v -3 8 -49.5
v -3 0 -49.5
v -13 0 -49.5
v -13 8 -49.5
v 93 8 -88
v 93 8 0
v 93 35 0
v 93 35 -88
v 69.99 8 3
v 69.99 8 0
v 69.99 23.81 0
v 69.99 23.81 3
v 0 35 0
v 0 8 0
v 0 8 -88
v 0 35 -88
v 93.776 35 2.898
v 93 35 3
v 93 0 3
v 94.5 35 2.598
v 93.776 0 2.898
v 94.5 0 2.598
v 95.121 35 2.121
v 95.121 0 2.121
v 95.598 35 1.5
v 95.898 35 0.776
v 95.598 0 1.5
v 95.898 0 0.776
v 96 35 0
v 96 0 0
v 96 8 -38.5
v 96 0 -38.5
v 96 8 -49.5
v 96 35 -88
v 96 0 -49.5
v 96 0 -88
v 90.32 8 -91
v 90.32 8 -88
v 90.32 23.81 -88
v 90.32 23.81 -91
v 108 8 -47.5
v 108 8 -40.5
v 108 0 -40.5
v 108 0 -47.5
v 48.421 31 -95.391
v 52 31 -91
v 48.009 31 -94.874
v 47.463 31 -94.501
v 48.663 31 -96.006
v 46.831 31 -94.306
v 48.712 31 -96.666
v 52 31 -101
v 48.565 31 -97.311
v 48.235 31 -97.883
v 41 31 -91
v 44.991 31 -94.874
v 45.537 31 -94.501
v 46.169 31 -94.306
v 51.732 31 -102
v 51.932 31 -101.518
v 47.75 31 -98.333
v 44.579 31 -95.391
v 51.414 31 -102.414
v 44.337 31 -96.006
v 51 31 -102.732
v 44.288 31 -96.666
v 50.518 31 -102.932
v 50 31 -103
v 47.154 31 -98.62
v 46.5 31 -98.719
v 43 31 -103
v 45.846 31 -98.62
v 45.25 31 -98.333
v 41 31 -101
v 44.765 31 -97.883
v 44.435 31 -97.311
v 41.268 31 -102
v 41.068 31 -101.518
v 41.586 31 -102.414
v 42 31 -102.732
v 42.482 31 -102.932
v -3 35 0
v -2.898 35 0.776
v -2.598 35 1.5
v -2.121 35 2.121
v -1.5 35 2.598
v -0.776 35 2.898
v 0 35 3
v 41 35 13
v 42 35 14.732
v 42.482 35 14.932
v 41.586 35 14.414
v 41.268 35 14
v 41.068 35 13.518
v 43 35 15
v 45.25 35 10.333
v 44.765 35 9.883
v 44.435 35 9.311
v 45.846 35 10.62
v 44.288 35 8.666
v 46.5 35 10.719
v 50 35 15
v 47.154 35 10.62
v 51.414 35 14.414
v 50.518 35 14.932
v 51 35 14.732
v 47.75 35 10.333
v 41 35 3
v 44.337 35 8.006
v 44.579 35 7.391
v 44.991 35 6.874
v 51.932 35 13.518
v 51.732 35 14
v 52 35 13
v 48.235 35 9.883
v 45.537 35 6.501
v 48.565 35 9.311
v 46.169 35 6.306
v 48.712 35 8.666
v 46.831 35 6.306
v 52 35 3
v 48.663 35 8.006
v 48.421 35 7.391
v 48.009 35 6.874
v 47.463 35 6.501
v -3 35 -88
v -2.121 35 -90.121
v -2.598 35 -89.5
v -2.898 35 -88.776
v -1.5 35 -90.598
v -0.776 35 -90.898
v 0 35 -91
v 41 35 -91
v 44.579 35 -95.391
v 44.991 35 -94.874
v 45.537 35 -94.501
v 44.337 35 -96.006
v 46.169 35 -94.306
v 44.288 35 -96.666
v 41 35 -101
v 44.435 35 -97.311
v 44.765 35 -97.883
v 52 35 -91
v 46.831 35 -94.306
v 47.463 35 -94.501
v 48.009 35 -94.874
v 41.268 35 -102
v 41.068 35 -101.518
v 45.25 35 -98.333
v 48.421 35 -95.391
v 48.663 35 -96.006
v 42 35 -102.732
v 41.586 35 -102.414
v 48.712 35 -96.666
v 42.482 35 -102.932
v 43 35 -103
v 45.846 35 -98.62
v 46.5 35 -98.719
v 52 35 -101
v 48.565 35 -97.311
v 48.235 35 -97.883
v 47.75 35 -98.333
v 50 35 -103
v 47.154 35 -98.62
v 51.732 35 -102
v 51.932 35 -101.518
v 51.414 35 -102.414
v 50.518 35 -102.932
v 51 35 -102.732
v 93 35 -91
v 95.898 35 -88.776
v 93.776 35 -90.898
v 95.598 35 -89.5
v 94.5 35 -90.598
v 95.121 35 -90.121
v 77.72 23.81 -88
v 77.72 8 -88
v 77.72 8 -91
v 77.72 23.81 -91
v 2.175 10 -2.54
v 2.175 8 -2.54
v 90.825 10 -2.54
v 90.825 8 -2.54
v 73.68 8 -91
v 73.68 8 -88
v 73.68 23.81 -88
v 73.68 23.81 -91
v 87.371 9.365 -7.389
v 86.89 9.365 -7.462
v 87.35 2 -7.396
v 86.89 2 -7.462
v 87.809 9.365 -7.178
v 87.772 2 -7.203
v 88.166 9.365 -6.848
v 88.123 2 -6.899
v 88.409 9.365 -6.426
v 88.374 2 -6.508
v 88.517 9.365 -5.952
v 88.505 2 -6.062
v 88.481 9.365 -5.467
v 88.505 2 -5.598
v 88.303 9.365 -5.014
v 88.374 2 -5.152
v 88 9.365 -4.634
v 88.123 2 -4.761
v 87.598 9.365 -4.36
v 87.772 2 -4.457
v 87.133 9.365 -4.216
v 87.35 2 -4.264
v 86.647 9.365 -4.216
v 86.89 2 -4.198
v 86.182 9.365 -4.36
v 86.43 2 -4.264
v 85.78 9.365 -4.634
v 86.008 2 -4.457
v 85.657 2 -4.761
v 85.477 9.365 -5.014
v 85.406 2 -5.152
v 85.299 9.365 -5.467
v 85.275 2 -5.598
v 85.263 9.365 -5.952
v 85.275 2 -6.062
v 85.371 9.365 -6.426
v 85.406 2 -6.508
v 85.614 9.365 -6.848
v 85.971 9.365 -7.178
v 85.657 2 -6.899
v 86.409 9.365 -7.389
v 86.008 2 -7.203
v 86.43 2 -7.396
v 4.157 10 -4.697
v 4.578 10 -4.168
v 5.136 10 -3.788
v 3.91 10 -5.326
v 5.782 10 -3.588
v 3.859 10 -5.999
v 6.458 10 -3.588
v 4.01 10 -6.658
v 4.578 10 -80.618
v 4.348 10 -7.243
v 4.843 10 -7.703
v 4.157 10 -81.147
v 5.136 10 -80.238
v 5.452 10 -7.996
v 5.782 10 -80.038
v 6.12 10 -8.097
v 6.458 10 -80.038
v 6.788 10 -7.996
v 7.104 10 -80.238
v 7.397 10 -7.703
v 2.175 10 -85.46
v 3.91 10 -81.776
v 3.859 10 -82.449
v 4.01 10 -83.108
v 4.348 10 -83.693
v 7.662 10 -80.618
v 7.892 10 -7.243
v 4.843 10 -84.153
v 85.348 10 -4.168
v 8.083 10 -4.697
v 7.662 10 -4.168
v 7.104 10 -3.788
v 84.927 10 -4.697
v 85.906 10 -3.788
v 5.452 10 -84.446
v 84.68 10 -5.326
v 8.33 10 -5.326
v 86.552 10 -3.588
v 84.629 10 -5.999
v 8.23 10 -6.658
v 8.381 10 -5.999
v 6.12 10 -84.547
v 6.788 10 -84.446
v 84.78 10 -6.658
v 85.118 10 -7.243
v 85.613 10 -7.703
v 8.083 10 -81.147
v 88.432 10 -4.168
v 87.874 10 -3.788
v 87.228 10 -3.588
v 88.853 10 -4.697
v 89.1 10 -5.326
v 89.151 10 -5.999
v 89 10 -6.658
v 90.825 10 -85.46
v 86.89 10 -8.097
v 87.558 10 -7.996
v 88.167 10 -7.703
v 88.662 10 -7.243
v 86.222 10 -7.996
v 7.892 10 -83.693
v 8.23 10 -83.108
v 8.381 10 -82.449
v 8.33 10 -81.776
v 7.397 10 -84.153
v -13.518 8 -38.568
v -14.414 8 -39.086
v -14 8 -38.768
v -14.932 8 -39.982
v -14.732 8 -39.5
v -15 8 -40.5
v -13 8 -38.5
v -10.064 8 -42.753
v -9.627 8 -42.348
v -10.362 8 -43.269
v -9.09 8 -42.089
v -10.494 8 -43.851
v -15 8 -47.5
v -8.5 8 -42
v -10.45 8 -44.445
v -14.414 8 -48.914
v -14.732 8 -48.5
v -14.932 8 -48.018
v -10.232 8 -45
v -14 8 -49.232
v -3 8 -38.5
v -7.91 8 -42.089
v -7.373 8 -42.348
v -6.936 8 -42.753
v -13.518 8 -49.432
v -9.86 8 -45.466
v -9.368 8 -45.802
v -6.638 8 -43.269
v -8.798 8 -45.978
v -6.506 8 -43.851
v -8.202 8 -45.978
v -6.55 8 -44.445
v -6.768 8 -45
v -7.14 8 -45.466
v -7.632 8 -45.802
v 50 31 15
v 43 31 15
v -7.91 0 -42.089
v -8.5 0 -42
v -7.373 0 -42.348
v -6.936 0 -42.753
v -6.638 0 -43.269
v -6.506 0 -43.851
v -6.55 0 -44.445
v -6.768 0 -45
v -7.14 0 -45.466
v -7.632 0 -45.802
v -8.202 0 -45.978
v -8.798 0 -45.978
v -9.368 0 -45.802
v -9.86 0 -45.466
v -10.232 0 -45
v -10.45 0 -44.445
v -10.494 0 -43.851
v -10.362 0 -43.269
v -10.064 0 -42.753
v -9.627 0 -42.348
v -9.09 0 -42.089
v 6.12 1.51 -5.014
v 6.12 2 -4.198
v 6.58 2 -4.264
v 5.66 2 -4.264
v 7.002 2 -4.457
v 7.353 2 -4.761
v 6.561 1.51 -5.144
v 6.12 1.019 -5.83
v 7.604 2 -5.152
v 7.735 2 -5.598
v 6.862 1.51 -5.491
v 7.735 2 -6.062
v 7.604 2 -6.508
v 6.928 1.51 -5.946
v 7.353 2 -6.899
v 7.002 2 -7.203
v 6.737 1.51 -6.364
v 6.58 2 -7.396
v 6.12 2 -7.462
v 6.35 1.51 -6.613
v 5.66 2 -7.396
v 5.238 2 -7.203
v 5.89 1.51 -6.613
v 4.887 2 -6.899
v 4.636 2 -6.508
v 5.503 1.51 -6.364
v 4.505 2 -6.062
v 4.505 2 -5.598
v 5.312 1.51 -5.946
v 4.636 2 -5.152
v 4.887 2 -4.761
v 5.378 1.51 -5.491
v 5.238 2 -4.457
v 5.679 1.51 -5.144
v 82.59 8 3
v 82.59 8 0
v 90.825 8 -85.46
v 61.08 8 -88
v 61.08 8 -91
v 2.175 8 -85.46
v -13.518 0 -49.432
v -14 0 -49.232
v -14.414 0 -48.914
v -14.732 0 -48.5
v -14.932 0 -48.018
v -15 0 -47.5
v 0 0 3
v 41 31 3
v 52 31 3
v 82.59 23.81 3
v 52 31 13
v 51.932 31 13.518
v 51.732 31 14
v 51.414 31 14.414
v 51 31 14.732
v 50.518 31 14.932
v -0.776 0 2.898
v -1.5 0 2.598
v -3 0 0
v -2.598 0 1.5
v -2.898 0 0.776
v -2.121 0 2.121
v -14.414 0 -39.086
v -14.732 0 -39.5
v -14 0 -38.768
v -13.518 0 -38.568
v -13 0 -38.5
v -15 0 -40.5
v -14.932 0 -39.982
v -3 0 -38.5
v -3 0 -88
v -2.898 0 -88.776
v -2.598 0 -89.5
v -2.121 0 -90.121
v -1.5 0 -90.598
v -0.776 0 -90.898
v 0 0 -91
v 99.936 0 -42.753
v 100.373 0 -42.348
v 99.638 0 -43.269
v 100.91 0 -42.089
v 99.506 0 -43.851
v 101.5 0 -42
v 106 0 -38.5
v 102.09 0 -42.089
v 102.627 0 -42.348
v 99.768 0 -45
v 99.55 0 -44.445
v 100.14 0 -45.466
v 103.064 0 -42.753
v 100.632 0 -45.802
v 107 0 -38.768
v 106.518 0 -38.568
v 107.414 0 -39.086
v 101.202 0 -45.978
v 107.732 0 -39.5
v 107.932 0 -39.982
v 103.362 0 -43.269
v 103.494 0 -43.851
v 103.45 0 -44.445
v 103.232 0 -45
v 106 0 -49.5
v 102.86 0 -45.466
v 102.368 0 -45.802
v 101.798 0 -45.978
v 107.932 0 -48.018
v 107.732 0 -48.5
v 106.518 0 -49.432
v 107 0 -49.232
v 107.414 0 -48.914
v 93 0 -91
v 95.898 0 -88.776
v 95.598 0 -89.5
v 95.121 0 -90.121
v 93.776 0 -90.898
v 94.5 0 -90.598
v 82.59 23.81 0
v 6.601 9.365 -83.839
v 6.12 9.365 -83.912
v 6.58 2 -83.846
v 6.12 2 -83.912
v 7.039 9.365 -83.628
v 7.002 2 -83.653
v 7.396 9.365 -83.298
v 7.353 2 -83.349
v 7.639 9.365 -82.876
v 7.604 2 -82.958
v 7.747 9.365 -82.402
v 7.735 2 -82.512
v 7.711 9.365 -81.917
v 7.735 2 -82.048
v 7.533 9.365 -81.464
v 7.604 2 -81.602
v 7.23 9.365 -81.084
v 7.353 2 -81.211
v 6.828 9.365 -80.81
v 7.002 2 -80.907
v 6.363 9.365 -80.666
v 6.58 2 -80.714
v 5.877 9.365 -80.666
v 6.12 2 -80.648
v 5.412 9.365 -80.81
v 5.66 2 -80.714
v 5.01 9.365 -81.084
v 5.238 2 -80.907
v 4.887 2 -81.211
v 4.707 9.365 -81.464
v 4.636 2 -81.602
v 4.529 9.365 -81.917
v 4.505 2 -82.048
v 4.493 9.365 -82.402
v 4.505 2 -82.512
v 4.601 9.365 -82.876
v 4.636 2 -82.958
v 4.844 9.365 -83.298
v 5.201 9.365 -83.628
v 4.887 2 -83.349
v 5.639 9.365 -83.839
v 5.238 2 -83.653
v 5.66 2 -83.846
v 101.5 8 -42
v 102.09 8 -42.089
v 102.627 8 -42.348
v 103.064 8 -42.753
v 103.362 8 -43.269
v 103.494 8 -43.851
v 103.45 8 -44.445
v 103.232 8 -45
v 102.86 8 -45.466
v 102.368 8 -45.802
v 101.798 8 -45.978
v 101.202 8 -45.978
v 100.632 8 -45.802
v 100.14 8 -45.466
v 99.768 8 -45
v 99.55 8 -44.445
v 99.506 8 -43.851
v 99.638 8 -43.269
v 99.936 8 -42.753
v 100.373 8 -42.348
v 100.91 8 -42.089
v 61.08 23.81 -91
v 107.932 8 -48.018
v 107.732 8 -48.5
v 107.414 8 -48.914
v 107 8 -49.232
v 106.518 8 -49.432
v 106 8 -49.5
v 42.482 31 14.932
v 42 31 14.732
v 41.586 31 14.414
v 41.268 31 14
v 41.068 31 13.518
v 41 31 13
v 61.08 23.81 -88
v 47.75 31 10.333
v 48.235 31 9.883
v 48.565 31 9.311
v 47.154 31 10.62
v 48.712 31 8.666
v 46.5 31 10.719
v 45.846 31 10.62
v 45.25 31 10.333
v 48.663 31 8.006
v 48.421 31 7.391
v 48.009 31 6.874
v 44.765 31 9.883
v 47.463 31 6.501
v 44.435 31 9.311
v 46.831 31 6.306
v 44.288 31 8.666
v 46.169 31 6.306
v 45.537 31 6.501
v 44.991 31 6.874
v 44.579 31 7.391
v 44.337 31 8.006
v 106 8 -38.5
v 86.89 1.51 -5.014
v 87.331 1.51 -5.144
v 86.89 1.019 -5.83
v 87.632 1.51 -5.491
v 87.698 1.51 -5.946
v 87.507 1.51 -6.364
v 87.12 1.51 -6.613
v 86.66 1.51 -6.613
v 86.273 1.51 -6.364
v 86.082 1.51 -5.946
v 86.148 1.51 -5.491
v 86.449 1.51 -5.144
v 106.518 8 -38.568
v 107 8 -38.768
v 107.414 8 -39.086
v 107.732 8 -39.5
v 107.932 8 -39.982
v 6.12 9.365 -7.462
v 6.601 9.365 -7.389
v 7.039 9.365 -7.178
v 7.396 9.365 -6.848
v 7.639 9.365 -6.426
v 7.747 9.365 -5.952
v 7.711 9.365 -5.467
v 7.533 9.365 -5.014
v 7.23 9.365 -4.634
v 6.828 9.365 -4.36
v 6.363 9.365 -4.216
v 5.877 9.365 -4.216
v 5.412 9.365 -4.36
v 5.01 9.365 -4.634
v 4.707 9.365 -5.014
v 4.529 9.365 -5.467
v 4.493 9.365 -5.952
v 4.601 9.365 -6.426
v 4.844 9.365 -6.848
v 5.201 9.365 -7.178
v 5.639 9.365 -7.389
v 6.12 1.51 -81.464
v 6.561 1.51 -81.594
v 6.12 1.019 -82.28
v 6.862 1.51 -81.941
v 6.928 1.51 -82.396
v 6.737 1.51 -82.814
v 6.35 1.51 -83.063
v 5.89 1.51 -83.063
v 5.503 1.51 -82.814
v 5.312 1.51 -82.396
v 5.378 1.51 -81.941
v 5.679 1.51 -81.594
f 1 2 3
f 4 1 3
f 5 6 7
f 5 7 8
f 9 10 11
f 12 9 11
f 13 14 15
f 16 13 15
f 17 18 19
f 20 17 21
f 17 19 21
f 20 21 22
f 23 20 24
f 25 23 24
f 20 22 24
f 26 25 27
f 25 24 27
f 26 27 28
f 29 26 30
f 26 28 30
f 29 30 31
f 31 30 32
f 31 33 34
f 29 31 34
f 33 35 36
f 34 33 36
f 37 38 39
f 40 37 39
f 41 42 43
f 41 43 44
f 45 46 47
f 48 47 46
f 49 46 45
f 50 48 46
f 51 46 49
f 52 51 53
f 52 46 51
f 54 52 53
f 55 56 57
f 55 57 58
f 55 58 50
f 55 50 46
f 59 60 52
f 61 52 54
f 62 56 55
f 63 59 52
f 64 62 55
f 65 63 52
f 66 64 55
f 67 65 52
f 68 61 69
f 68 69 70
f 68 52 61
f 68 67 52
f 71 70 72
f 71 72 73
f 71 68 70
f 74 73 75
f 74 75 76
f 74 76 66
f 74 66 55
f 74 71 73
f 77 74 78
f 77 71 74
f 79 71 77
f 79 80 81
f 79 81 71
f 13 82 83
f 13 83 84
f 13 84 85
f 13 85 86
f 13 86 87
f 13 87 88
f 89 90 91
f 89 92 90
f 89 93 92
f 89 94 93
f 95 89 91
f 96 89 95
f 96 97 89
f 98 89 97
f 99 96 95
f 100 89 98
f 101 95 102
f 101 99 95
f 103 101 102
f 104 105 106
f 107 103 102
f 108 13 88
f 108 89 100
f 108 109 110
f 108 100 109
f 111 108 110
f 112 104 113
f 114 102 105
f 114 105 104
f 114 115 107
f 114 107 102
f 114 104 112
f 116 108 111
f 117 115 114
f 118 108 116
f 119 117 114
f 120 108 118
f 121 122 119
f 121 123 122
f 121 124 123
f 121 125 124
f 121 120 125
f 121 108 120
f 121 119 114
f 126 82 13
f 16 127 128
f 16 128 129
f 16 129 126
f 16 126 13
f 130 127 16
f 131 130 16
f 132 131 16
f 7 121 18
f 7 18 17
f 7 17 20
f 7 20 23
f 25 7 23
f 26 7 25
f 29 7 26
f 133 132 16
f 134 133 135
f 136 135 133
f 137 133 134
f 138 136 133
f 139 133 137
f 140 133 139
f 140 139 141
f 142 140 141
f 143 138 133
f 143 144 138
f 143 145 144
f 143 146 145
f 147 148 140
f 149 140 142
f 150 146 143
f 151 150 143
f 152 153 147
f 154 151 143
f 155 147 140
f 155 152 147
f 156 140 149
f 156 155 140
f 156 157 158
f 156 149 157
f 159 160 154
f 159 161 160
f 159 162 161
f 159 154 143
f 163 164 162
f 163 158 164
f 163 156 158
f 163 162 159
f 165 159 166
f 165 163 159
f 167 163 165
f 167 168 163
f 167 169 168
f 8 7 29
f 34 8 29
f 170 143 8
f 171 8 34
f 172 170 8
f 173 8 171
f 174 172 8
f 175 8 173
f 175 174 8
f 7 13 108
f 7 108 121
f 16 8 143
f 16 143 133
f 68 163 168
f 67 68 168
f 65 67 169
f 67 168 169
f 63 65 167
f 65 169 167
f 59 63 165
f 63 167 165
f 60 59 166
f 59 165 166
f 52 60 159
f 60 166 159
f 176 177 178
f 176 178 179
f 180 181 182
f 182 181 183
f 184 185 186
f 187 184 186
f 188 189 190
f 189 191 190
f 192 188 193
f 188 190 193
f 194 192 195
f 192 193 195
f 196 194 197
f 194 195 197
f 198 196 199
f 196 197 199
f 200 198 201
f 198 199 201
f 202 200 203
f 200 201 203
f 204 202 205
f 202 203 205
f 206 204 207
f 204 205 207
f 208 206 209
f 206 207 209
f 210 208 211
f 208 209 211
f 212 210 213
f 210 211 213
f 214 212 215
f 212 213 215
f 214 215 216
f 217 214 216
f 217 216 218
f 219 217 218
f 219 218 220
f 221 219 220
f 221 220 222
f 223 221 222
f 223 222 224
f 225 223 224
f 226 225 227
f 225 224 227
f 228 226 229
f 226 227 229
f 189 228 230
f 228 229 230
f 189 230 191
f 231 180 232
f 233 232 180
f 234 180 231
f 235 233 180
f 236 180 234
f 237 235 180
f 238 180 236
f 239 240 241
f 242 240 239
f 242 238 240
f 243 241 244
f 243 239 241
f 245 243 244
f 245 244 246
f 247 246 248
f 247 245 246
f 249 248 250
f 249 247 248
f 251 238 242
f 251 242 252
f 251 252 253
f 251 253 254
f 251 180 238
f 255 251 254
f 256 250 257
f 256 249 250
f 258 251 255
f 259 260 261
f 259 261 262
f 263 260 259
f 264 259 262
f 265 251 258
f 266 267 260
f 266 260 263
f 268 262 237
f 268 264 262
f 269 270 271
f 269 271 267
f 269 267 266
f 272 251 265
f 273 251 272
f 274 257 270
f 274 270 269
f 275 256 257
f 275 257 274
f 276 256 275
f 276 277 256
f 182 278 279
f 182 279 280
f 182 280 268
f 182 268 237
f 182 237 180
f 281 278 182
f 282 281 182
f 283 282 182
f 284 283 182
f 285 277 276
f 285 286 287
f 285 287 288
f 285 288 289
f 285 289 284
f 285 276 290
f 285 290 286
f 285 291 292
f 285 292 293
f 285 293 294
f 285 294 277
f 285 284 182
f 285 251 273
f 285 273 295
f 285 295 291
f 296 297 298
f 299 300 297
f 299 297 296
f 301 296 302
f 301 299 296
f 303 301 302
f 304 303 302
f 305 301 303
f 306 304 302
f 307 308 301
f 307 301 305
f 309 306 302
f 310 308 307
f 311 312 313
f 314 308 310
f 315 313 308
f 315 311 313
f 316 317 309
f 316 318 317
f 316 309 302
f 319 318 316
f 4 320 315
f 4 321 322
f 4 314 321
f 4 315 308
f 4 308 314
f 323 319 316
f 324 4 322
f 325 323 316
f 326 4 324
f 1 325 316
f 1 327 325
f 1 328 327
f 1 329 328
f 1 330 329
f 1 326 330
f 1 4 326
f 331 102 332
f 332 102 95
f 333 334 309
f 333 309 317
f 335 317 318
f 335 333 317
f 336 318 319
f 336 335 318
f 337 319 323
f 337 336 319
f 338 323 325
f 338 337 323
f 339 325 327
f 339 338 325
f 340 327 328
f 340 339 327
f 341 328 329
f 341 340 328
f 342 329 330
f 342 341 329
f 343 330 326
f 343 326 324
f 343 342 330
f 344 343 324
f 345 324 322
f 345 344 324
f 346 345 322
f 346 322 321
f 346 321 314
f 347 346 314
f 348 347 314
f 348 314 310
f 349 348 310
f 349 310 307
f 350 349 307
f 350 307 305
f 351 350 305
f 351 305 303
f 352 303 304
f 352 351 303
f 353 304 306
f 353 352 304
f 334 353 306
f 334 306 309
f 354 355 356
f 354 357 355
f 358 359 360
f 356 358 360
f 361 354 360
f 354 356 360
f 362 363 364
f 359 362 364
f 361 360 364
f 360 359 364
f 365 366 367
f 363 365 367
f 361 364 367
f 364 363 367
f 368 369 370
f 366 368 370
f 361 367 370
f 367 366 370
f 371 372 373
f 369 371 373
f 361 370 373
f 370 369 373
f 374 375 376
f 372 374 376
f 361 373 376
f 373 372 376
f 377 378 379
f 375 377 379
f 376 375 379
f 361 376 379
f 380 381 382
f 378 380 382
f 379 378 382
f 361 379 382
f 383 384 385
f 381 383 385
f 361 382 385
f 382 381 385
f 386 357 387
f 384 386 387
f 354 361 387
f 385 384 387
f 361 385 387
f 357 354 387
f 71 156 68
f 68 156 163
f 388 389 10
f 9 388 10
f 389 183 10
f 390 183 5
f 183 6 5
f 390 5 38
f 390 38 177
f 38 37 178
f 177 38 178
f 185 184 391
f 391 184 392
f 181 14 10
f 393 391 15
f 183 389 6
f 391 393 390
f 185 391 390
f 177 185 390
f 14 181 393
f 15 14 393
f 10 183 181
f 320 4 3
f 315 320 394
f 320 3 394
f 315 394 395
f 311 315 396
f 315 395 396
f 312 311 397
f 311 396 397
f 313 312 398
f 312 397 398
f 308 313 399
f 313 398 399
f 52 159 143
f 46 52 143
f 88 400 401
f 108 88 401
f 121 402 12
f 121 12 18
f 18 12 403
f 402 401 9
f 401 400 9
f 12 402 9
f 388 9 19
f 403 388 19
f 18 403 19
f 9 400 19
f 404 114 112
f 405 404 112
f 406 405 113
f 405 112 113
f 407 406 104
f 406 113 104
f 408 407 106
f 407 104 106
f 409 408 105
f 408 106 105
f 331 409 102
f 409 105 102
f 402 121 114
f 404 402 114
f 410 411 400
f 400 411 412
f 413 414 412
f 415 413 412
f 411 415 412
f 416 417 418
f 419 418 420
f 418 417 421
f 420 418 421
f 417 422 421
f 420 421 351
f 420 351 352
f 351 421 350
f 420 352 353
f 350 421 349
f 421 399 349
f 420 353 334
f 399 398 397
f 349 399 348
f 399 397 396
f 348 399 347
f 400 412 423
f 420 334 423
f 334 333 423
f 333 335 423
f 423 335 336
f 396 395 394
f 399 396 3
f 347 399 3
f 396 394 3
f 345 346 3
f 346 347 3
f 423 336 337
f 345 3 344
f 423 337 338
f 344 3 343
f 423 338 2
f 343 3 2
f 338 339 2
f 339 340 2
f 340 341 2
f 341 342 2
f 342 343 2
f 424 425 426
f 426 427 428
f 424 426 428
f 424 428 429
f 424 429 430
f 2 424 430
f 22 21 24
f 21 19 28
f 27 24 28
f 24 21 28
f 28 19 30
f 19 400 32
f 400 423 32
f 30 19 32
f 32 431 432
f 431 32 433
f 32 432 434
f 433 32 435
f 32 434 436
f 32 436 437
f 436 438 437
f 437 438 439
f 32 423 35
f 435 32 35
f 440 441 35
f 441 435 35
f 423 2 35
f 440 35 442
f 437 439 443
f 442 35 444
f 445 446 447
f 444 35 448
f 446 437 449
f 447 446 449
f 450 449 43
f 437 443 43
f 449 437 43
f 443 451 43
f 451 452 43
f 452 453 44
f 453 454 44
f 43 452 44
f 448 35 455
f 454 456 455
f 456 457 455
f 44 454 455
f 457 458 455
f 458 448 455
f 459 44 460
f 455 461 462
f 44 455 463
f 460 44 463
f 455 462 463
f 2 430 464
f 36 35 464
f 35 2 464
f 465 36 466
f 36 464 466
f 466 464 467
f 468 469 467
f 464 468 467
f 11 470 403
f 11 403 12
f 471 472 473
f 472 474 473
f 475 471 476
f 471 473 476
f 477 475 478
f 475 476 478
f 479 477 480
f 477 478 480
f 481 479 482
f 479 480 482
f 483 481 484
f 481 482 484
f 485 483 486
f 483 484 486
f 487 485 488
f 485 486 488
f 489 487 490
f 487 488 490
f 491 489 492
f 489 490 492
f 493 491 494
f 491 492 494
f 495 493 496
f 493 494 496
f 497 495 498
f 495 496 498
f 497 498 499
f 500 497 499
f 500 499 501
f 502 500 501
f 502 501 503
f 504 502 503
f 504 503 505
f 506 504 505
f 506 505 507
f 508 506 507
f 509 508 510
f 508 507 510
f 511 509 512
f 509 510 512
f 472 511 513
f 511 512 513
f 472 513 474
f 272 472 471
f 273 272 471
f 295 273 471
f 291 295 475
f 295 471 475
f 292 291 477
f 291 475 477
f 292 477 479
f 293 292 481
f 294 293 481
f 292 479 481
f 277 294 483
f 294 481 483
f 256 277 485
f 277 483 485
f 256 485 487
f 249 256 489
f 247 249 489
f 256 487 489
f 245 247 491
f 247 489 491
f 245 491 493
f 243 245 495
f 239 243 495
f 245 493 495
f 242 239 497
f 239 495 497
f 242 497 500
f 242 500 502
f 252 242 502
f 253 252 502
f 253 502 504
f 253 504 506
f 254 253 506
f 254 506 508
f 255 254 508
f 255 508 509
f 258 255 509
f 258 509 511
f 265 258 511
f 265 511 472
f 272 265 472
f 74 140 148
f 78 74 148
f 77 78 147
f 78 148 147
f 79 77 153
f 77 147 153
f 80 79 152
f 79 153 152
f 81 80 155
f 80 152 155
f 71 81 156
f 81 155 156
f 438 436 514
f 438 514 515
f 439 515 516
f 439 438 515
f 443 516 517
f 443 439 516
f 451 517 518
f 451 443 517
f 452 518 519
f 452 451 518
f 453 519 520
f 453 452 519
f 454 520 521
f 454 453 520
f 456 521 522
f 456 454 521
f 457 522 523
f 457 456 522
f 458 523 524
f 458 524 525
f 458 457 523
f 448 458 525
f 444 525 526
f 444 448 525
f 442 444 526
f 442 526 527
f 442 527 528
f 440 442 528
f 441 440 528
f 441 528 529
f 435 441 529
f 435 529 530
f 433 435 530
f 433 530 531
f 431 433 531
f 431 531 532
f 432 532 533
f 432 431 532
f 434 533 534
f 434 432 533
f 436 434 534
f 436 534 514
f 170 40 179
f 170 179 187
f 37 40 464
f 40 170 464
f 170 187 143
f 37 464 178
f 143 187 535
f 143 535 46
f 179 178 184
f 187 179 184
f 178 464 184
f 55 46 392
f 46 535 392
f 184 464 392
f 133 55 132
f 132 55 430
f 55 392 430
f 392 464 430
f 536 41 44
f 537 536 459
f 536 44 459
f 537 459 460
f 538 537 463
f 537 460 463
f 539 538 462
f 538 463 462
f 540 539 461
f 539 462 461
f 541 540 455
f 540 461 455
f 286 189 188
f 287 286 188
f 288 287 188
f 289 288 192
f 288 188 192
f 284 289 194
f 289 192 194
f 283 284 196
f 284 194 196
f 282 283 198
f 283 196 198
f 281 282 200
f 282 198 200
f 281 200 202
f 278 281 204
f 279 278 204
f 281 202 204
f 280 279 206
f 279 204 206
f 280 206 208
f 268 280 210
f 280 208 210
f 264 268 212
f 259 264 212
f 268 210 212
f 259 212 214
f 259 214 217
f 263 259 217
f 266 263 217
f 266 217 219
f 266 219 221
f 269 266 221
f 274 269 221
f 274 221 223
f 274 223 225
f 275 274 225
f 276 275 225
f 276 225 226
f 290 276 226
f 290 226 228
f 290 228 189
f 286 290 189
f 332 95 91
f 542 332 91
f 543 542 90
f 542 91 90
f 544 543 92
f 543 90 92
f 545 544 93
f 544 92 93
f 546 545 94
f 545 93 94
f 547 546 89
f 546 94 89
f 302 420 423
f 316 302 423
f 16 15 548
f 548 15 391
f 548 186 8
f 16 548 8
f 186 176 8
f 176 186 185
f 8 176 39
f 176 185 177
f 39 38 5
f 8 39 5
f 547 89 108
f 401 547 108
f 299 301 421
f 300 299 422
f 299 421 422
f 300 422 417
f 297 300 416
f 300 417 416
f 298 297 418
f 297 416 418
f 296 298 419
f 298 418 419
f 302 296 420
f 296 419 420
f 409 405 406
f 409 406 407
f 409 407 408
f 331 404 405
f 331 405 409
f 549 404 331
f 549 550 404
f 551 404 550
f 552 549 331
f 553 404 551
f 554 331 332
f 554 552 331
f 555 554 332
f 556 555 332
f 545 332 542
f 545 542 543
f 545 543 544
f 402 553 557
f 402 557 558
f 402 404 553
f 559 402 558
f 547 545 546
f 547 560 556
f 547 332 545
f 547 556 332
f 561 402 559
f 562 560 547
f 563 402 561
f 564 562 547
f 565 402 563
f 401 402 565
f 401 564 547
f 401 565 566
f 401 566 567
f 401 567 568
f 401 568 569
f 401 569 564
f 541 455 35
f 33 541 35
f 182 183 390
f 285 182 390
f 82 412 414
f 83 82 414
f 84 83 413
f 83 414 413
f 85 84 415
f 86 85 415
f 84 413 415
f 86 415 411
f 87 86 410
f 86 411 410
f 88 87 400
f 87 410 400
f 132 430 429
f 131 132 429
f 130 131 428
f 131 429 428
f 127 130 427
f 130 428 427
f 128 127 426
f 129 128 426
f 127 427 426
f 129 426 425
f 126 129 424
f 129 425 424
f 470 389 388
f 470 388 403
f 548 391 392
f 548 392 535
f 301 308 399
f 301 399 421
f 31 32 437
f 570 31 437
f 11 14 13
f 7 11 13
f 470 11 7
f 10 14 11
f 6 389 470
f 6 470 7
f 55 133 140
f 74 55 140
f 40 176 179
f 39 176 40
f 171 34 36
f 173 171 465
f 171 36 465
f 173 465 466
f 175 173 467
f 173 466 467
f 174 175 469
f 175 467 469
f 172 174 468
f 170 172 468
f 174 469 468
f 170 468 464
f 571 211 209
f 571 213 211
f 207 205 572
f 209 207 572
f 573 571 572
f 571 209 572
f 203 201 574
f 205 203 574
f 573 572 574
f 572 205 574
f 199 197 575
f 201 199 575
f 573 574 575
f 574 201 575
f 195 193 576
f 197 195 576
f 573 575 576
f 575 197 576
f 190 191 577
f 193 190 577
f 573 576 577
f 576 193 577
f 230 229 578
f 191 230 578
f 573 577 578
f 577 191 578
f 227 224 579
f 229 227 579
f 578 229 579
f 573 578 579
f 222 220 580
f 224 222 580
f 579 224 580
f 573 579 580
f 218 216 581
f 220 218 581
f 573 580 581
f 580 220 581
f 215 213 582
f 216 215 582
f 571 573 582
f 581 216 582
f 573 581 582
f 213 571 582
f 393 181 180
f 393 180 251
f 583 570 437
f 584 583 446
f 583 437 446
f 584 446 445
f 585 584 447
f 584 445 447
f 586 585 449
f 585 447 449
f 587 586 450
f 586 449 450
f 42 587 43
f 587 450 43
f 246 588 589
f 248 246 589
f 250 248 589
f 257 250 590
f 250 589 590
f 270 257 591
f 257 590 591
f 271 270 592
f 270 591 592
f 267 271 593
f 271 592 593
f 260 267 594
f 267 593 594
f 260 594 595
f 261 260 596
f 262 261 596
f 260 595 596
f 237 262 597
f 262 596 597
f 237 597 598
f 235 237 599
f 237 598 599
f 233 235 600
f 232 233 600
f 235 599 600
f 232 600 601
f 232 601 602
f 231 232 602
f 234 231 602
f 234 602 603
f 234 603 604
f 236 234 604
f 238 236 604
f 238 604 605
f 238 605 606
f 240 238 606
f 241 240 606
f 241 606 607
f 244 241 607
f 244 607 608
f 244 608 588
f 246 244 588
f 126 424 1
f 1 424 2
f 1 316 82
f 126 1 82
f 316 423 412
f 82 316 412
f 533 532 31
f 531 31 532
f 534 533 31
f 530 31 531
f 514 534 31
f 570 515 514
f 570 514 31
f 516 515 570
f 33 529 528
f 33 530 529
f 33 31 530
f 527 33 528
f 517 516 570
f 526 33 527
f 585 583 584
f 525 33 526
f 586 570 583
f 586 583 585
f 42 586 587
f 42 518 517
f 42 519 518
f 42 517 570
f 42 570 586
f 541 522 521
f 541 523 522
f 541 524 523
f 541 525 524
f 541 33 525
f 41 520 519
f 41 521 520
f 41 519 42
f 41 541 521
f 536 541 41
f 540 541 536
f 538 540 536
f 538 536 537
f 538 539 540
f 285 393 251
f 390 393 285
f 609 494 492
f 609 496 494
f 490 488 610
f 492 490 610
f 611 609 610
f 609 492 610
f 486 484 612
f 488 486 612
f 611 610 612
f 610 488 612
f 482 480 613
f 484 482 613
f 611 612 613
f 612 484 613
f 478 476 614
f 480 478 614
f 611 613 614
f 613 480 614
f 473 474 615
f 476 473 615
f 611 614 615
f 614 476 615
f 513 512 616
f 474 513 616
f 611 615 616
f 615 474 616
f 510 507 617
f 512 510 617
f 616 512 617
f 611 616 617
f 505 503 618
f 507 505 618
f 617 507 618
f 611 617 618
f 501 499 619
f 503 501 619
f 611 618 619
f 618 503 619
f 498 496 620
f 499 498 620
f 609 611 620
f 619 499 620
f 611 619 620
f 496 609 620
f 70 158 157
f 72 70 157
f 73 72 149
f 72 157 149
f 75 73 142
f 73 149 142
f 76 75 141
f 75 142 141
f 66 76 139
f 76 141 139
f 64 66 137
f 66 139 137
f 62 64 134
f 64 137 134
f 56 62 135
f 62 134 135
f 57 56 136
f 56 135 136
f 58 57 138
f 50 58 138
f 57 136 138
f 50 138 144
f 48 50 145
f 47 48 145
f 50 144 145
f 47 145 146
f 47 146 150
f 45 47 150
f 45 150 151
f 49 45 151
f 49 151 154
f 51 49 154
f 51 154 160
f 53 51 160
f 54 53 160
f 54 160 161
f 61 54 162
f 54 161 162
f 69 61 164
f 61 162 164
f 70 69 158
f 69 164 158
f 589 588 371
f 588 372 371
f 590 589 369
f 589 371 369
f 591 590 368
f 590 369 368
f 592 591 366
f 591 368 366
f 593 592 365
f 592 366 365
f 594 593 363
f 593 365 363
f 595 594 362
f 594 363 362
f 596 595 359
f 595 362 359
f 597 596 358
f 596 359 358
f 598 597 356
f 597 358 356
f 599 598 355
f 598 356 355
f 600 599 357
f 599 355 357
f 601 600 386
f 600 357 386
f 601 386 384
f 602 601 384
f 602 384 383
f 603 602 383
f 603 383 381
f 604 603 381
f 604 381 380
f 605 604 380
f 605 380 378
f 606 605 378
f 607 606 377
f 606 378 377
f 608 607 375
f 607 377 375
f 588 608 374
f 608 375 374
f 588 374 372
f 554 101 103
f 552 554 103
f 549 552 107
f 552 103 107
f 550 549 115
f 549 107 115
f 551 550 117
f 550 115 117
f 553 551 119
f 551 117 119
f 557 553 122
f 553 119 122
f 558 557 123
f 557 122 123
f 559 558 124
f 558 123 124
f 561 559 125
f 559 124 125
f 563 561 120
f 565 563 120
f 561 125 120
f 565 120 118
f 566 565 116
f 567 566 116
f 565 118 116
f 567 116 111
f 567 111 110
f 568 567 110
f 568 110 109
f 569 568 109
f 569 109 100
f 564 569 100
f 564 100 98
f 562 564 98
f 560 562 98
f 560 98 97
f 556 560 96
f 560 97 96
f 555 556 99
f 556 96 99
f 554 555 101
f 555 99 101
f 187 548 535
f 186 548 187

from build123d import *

# Parameters (mm, degrees)
ESBO_O1_W                        = 93
ESBO_O1_H                        = 88
RESSALTO_EXTRUS_O2_DEPTH         = 35
ESBO_O1_5_W                      = 93
ESBO_O1_5_H                      = 88
RESSALTO_EXTRUS_O3_DEPTH         = 8
ESBO_O1_7_R                      = 2
RESSALTO_EXTRUS_O6_DEPTH         = 8
ESBO_O4_R                        = 2.218632056
RESSALTO_EXTRUS_O7_DEPTH         = 4
ESBO_O5_W                        = 88.65
ESBO_O5_H                        = 82.92
RESSALTO_EXTRUS_O8_DEPTH         = 2
ESBO_O7_W                        = 12.6
ESBO_O7_H                        = 15.81
CORTE_EXTRUS_O1_DEPTH            = 154.290573748
ESBO_O8_W                        = 12.6
ESBO_O8_H                        = 15.81
CORTE_EXTRUS_O2_DEPTH            = 154.290573748
FURO_COM_FOLGA_DE_41_D           = 3.2639
FURO_COM_FOLGA_DE_41_DEPTH       = 8
FURO_COM_FOLGA_DE_41_CSINK_D     = 4.5339
FURO_COM_FOLGA_DE_41_CSINK_ANGLE = 90
FURO_COM_FOLGA_DE_41_TIP         = 0.980574487


with BuildPart() as part:
    # Esboço1 → Ressalto-extrusão2 (new body)
    with BuildSketch(Plane(origin=(0, 0, 0), x_dir=(1, 0, 0), z_dir=(0, 1, 0))):
        with BuildLine():
            ThreePointArc((-3, 0), (-2.121320344, -2.121320344), (0, -3))
            Line((0, -3), (93, -3))
            ThreePointArc((93, -3), (95.121320344, -2.121320344), (96, 0))
            Line((96, 0), (96, 38.5))
            Line((96, 38.5), (96, 49.5))
            Line((96, 49.5), (96, 88))
            ThreePointArc((96, 88), (95.121320344, 90.121320344), (93, 91))
            Line((93, 91), (0, 91))
            ThreePointArc((0, 91), (-2.121320344, 90.121320344), (-3, 88))
            Line((-3, 88), (-3, 49.5))
            Line((-3, 49.5), (-3, 38.5))
            Line((-3, 38.5), (-3, 0))
        make_face()
        with Locations((46.5, 44)):
            Rectangle(ESBO_O1_W, ESBO_O1_H, mode=Mode.SUBTRACT)
    extrude(amount=RESSALTO_EXTRUS_O2_DEPTH)

    # Esboço1<5> → Ressalto-extrusão3 (add)
    with BuildSketch(Plane(origin=(0, 0, 0), x_dir=(1, 0, 0), z_dir=(0, 1, 0))):
        with Locations((46.5, 44)):
            Rectangle(ESBO_O1_5_W, ESBO_O1_5_H)
    extrude(amount=RESSALTO_EXTRUS_O3_DEPTH)

    # Esboço1<7> → Ressalto-extrusão6 (add)
    # profile 1 of 2: a face of its own
    with BuildSketch(Plane(origin=(0, 0, 0), x_dir=(1, 0, 0), z_dir=(0, 1, 0))):
        with BuildLine():
            Line((-13, 38.5), (-3, 38.5))
            Line((-3, 38.5), (-3, 49.5))
            Line((-3, 49.5), (-13, 49.5))
            ThreePointArc((-13, 49.5), (-14.414213562, 48.914213562), (-15, 47.5))
            Line((-15, 47.5), (-15, 40.5))
            ThreePointArc((-15, 40.5), (-14.414213562, 39.085786438), (-13, 38.5))
        make_face()
        with Locations((-8.5, 44)):
            Circle(ESBO_O1_7_R, mode=Mode.SUBTRACT)
    # profile 2 of 2: a face of its own
    with BuildSketch(Plane(origin=(0, 0, 0), x_dir=(1, 0, 0), z_dir=(0, 1, 0))):
        with BuildLine():
            Line((96, 49.5), (96, 38.5))
            Line((96, 38.5), (106, 38.5))
            ThreePointArc((106, 38.5), (107.414213562, 39.085786438), (108, 40.5))
            Line((108, 40.5), (108, 47.5))
            ThreePointArc((108, 47.5), (107.414213562, 48.914213562), (106, 49.5))
            Line((106, 49.5), (96, 49.5))
        make_face()
        with Locations((101.5, 44)):
            Circle(ESBO_O1_7_R, mode=Mode.SUBTRACT)
    extrude(amount=RESSALTO_EXTRUS_O6_DEPTH)

    # Esboço4 → Ressalto-extrusão7 (add)
    # profile 1 of 2: a face of its own
    with BuildSketch(Plane(origin=(0, 35, 0), x_dir=(1, 0, 0), z_dir=(0, 1, 0))):
        with BuildLine():
            Line((41, -3), (52, -3))
            Line((52, -3), (52, -13))
            ThreePointArc((52, -13), (51.414213562, -14.414213562), (50, -15))
            Line((50, -15), (43, -15))
            ThreePointArc((43, -15), (41.585786438, -14.414213562), (41, -13))
            Line((41, -13), (41, -3))
        make_face()
        with Locations((46.5, -8.5)):
            Circle(ESBO_O4_R, mode=Mode.SUBTRACT)
    # profile 2 of 2: a face of its own
    with BuildSketch(Plane(origin=(0, 35, 0), x_dir=(1, 0, 0), z_dir=(0, 1, 0))):
        with BuildLine():
            Line((43, 103), (50, 103))
            ThreePointArc((50, 103), (51.414213562, 102.414213562), (52, 101))
            Line((52, 101), (52, 91))
            Line((52, 91), (41, 91))
            Line((41, 91), (41, 101))
            ThreePointArc((41, 101), (41.585786438, 102.414213562), (43, 103))
        make_face()
        with Locations((46.5, 96.5)):
            Circle(ESBO_O4_R, mode=Mode.SUBTRACT)
    extrude(amount=-RESSALTO_EXTRUS_O7_DEPTH)

    # Esboço5 → Ressalto-extrusão8 (add)
    with BuildSketch(Plane(origin=(0, 8, 0), x_dir=(1, 0, 0), z_dir=(0, 1, 0))):
        with Locations((46.5, 44)):
            Rectangle(ESBO_O5_W, ESBO_O5_H)
    extrude(amount=RESSALTO_EXTRUS_O8_DEPTH)

    # Esboço7 → Corte-extrusão1 (cut, through all)
    with BuildSketch(Plane.XY.offset(-88)):
        with Locations((67.38, 15.905)):
            Rectangle(ESBO_O7_W, ESBO_O7_H)
        with Locations((84.02, 15.905)):
            Rectangle(ESBO_O7_W, ESBO_O7_H)
    extrude(amount=-CORTE_EXTRUS_O1_DEPTH, mode=Mode.SUBTRACT)

    # Esboço8 → Corte-extrusão2 (cut, through all)
    with BuildSketch(Plane(origin=(0, 0, 0), x_dir=(-1, 0, 0), z_dir=(0, 0, -1))):
        with Locations((-76.29, 15.905)):
            Rectangle(ESBO_O8_W, ESBO_O8_H)
    extrude(amount=-CORTE_EXTRUS_O2_DEPTH, mode=Mode.SUBTRACT)

    # Furo com folga de #41
    with Locations(Plane(origin=(6.12, 10, -82.28), x_dir=(0, 0, 1), z_dir=(0, 1, 0))):
        with Locations((0, 0), (76.45, 0), (76.45, 80.77)):
            CounterSinkHole(FURO_COM_FOLGA_DE_41_D / 2, FURO_COM_FOLGA_DE_41_CSINK_D / 2, depth=FURO_COM_FOLGA_DE_41_DEPTH, counter_sink_angle=FURO_COM_FOLGA_DE_41_CSINK_ANGLE)
            with Locations((0, 0, -(FURO_COM_FOLGA_DE_41_DEPTH + FURO_COM_FOLGA_DE_41_TIP / 2))):  # 118° drill point
                Cone(0, FURO_COM_FOLGA_DE_41_D / 2, FURO_COM_FOLGA_DE_41_TIP, mode=Mode.SUBTRACT)


solid = part.part
